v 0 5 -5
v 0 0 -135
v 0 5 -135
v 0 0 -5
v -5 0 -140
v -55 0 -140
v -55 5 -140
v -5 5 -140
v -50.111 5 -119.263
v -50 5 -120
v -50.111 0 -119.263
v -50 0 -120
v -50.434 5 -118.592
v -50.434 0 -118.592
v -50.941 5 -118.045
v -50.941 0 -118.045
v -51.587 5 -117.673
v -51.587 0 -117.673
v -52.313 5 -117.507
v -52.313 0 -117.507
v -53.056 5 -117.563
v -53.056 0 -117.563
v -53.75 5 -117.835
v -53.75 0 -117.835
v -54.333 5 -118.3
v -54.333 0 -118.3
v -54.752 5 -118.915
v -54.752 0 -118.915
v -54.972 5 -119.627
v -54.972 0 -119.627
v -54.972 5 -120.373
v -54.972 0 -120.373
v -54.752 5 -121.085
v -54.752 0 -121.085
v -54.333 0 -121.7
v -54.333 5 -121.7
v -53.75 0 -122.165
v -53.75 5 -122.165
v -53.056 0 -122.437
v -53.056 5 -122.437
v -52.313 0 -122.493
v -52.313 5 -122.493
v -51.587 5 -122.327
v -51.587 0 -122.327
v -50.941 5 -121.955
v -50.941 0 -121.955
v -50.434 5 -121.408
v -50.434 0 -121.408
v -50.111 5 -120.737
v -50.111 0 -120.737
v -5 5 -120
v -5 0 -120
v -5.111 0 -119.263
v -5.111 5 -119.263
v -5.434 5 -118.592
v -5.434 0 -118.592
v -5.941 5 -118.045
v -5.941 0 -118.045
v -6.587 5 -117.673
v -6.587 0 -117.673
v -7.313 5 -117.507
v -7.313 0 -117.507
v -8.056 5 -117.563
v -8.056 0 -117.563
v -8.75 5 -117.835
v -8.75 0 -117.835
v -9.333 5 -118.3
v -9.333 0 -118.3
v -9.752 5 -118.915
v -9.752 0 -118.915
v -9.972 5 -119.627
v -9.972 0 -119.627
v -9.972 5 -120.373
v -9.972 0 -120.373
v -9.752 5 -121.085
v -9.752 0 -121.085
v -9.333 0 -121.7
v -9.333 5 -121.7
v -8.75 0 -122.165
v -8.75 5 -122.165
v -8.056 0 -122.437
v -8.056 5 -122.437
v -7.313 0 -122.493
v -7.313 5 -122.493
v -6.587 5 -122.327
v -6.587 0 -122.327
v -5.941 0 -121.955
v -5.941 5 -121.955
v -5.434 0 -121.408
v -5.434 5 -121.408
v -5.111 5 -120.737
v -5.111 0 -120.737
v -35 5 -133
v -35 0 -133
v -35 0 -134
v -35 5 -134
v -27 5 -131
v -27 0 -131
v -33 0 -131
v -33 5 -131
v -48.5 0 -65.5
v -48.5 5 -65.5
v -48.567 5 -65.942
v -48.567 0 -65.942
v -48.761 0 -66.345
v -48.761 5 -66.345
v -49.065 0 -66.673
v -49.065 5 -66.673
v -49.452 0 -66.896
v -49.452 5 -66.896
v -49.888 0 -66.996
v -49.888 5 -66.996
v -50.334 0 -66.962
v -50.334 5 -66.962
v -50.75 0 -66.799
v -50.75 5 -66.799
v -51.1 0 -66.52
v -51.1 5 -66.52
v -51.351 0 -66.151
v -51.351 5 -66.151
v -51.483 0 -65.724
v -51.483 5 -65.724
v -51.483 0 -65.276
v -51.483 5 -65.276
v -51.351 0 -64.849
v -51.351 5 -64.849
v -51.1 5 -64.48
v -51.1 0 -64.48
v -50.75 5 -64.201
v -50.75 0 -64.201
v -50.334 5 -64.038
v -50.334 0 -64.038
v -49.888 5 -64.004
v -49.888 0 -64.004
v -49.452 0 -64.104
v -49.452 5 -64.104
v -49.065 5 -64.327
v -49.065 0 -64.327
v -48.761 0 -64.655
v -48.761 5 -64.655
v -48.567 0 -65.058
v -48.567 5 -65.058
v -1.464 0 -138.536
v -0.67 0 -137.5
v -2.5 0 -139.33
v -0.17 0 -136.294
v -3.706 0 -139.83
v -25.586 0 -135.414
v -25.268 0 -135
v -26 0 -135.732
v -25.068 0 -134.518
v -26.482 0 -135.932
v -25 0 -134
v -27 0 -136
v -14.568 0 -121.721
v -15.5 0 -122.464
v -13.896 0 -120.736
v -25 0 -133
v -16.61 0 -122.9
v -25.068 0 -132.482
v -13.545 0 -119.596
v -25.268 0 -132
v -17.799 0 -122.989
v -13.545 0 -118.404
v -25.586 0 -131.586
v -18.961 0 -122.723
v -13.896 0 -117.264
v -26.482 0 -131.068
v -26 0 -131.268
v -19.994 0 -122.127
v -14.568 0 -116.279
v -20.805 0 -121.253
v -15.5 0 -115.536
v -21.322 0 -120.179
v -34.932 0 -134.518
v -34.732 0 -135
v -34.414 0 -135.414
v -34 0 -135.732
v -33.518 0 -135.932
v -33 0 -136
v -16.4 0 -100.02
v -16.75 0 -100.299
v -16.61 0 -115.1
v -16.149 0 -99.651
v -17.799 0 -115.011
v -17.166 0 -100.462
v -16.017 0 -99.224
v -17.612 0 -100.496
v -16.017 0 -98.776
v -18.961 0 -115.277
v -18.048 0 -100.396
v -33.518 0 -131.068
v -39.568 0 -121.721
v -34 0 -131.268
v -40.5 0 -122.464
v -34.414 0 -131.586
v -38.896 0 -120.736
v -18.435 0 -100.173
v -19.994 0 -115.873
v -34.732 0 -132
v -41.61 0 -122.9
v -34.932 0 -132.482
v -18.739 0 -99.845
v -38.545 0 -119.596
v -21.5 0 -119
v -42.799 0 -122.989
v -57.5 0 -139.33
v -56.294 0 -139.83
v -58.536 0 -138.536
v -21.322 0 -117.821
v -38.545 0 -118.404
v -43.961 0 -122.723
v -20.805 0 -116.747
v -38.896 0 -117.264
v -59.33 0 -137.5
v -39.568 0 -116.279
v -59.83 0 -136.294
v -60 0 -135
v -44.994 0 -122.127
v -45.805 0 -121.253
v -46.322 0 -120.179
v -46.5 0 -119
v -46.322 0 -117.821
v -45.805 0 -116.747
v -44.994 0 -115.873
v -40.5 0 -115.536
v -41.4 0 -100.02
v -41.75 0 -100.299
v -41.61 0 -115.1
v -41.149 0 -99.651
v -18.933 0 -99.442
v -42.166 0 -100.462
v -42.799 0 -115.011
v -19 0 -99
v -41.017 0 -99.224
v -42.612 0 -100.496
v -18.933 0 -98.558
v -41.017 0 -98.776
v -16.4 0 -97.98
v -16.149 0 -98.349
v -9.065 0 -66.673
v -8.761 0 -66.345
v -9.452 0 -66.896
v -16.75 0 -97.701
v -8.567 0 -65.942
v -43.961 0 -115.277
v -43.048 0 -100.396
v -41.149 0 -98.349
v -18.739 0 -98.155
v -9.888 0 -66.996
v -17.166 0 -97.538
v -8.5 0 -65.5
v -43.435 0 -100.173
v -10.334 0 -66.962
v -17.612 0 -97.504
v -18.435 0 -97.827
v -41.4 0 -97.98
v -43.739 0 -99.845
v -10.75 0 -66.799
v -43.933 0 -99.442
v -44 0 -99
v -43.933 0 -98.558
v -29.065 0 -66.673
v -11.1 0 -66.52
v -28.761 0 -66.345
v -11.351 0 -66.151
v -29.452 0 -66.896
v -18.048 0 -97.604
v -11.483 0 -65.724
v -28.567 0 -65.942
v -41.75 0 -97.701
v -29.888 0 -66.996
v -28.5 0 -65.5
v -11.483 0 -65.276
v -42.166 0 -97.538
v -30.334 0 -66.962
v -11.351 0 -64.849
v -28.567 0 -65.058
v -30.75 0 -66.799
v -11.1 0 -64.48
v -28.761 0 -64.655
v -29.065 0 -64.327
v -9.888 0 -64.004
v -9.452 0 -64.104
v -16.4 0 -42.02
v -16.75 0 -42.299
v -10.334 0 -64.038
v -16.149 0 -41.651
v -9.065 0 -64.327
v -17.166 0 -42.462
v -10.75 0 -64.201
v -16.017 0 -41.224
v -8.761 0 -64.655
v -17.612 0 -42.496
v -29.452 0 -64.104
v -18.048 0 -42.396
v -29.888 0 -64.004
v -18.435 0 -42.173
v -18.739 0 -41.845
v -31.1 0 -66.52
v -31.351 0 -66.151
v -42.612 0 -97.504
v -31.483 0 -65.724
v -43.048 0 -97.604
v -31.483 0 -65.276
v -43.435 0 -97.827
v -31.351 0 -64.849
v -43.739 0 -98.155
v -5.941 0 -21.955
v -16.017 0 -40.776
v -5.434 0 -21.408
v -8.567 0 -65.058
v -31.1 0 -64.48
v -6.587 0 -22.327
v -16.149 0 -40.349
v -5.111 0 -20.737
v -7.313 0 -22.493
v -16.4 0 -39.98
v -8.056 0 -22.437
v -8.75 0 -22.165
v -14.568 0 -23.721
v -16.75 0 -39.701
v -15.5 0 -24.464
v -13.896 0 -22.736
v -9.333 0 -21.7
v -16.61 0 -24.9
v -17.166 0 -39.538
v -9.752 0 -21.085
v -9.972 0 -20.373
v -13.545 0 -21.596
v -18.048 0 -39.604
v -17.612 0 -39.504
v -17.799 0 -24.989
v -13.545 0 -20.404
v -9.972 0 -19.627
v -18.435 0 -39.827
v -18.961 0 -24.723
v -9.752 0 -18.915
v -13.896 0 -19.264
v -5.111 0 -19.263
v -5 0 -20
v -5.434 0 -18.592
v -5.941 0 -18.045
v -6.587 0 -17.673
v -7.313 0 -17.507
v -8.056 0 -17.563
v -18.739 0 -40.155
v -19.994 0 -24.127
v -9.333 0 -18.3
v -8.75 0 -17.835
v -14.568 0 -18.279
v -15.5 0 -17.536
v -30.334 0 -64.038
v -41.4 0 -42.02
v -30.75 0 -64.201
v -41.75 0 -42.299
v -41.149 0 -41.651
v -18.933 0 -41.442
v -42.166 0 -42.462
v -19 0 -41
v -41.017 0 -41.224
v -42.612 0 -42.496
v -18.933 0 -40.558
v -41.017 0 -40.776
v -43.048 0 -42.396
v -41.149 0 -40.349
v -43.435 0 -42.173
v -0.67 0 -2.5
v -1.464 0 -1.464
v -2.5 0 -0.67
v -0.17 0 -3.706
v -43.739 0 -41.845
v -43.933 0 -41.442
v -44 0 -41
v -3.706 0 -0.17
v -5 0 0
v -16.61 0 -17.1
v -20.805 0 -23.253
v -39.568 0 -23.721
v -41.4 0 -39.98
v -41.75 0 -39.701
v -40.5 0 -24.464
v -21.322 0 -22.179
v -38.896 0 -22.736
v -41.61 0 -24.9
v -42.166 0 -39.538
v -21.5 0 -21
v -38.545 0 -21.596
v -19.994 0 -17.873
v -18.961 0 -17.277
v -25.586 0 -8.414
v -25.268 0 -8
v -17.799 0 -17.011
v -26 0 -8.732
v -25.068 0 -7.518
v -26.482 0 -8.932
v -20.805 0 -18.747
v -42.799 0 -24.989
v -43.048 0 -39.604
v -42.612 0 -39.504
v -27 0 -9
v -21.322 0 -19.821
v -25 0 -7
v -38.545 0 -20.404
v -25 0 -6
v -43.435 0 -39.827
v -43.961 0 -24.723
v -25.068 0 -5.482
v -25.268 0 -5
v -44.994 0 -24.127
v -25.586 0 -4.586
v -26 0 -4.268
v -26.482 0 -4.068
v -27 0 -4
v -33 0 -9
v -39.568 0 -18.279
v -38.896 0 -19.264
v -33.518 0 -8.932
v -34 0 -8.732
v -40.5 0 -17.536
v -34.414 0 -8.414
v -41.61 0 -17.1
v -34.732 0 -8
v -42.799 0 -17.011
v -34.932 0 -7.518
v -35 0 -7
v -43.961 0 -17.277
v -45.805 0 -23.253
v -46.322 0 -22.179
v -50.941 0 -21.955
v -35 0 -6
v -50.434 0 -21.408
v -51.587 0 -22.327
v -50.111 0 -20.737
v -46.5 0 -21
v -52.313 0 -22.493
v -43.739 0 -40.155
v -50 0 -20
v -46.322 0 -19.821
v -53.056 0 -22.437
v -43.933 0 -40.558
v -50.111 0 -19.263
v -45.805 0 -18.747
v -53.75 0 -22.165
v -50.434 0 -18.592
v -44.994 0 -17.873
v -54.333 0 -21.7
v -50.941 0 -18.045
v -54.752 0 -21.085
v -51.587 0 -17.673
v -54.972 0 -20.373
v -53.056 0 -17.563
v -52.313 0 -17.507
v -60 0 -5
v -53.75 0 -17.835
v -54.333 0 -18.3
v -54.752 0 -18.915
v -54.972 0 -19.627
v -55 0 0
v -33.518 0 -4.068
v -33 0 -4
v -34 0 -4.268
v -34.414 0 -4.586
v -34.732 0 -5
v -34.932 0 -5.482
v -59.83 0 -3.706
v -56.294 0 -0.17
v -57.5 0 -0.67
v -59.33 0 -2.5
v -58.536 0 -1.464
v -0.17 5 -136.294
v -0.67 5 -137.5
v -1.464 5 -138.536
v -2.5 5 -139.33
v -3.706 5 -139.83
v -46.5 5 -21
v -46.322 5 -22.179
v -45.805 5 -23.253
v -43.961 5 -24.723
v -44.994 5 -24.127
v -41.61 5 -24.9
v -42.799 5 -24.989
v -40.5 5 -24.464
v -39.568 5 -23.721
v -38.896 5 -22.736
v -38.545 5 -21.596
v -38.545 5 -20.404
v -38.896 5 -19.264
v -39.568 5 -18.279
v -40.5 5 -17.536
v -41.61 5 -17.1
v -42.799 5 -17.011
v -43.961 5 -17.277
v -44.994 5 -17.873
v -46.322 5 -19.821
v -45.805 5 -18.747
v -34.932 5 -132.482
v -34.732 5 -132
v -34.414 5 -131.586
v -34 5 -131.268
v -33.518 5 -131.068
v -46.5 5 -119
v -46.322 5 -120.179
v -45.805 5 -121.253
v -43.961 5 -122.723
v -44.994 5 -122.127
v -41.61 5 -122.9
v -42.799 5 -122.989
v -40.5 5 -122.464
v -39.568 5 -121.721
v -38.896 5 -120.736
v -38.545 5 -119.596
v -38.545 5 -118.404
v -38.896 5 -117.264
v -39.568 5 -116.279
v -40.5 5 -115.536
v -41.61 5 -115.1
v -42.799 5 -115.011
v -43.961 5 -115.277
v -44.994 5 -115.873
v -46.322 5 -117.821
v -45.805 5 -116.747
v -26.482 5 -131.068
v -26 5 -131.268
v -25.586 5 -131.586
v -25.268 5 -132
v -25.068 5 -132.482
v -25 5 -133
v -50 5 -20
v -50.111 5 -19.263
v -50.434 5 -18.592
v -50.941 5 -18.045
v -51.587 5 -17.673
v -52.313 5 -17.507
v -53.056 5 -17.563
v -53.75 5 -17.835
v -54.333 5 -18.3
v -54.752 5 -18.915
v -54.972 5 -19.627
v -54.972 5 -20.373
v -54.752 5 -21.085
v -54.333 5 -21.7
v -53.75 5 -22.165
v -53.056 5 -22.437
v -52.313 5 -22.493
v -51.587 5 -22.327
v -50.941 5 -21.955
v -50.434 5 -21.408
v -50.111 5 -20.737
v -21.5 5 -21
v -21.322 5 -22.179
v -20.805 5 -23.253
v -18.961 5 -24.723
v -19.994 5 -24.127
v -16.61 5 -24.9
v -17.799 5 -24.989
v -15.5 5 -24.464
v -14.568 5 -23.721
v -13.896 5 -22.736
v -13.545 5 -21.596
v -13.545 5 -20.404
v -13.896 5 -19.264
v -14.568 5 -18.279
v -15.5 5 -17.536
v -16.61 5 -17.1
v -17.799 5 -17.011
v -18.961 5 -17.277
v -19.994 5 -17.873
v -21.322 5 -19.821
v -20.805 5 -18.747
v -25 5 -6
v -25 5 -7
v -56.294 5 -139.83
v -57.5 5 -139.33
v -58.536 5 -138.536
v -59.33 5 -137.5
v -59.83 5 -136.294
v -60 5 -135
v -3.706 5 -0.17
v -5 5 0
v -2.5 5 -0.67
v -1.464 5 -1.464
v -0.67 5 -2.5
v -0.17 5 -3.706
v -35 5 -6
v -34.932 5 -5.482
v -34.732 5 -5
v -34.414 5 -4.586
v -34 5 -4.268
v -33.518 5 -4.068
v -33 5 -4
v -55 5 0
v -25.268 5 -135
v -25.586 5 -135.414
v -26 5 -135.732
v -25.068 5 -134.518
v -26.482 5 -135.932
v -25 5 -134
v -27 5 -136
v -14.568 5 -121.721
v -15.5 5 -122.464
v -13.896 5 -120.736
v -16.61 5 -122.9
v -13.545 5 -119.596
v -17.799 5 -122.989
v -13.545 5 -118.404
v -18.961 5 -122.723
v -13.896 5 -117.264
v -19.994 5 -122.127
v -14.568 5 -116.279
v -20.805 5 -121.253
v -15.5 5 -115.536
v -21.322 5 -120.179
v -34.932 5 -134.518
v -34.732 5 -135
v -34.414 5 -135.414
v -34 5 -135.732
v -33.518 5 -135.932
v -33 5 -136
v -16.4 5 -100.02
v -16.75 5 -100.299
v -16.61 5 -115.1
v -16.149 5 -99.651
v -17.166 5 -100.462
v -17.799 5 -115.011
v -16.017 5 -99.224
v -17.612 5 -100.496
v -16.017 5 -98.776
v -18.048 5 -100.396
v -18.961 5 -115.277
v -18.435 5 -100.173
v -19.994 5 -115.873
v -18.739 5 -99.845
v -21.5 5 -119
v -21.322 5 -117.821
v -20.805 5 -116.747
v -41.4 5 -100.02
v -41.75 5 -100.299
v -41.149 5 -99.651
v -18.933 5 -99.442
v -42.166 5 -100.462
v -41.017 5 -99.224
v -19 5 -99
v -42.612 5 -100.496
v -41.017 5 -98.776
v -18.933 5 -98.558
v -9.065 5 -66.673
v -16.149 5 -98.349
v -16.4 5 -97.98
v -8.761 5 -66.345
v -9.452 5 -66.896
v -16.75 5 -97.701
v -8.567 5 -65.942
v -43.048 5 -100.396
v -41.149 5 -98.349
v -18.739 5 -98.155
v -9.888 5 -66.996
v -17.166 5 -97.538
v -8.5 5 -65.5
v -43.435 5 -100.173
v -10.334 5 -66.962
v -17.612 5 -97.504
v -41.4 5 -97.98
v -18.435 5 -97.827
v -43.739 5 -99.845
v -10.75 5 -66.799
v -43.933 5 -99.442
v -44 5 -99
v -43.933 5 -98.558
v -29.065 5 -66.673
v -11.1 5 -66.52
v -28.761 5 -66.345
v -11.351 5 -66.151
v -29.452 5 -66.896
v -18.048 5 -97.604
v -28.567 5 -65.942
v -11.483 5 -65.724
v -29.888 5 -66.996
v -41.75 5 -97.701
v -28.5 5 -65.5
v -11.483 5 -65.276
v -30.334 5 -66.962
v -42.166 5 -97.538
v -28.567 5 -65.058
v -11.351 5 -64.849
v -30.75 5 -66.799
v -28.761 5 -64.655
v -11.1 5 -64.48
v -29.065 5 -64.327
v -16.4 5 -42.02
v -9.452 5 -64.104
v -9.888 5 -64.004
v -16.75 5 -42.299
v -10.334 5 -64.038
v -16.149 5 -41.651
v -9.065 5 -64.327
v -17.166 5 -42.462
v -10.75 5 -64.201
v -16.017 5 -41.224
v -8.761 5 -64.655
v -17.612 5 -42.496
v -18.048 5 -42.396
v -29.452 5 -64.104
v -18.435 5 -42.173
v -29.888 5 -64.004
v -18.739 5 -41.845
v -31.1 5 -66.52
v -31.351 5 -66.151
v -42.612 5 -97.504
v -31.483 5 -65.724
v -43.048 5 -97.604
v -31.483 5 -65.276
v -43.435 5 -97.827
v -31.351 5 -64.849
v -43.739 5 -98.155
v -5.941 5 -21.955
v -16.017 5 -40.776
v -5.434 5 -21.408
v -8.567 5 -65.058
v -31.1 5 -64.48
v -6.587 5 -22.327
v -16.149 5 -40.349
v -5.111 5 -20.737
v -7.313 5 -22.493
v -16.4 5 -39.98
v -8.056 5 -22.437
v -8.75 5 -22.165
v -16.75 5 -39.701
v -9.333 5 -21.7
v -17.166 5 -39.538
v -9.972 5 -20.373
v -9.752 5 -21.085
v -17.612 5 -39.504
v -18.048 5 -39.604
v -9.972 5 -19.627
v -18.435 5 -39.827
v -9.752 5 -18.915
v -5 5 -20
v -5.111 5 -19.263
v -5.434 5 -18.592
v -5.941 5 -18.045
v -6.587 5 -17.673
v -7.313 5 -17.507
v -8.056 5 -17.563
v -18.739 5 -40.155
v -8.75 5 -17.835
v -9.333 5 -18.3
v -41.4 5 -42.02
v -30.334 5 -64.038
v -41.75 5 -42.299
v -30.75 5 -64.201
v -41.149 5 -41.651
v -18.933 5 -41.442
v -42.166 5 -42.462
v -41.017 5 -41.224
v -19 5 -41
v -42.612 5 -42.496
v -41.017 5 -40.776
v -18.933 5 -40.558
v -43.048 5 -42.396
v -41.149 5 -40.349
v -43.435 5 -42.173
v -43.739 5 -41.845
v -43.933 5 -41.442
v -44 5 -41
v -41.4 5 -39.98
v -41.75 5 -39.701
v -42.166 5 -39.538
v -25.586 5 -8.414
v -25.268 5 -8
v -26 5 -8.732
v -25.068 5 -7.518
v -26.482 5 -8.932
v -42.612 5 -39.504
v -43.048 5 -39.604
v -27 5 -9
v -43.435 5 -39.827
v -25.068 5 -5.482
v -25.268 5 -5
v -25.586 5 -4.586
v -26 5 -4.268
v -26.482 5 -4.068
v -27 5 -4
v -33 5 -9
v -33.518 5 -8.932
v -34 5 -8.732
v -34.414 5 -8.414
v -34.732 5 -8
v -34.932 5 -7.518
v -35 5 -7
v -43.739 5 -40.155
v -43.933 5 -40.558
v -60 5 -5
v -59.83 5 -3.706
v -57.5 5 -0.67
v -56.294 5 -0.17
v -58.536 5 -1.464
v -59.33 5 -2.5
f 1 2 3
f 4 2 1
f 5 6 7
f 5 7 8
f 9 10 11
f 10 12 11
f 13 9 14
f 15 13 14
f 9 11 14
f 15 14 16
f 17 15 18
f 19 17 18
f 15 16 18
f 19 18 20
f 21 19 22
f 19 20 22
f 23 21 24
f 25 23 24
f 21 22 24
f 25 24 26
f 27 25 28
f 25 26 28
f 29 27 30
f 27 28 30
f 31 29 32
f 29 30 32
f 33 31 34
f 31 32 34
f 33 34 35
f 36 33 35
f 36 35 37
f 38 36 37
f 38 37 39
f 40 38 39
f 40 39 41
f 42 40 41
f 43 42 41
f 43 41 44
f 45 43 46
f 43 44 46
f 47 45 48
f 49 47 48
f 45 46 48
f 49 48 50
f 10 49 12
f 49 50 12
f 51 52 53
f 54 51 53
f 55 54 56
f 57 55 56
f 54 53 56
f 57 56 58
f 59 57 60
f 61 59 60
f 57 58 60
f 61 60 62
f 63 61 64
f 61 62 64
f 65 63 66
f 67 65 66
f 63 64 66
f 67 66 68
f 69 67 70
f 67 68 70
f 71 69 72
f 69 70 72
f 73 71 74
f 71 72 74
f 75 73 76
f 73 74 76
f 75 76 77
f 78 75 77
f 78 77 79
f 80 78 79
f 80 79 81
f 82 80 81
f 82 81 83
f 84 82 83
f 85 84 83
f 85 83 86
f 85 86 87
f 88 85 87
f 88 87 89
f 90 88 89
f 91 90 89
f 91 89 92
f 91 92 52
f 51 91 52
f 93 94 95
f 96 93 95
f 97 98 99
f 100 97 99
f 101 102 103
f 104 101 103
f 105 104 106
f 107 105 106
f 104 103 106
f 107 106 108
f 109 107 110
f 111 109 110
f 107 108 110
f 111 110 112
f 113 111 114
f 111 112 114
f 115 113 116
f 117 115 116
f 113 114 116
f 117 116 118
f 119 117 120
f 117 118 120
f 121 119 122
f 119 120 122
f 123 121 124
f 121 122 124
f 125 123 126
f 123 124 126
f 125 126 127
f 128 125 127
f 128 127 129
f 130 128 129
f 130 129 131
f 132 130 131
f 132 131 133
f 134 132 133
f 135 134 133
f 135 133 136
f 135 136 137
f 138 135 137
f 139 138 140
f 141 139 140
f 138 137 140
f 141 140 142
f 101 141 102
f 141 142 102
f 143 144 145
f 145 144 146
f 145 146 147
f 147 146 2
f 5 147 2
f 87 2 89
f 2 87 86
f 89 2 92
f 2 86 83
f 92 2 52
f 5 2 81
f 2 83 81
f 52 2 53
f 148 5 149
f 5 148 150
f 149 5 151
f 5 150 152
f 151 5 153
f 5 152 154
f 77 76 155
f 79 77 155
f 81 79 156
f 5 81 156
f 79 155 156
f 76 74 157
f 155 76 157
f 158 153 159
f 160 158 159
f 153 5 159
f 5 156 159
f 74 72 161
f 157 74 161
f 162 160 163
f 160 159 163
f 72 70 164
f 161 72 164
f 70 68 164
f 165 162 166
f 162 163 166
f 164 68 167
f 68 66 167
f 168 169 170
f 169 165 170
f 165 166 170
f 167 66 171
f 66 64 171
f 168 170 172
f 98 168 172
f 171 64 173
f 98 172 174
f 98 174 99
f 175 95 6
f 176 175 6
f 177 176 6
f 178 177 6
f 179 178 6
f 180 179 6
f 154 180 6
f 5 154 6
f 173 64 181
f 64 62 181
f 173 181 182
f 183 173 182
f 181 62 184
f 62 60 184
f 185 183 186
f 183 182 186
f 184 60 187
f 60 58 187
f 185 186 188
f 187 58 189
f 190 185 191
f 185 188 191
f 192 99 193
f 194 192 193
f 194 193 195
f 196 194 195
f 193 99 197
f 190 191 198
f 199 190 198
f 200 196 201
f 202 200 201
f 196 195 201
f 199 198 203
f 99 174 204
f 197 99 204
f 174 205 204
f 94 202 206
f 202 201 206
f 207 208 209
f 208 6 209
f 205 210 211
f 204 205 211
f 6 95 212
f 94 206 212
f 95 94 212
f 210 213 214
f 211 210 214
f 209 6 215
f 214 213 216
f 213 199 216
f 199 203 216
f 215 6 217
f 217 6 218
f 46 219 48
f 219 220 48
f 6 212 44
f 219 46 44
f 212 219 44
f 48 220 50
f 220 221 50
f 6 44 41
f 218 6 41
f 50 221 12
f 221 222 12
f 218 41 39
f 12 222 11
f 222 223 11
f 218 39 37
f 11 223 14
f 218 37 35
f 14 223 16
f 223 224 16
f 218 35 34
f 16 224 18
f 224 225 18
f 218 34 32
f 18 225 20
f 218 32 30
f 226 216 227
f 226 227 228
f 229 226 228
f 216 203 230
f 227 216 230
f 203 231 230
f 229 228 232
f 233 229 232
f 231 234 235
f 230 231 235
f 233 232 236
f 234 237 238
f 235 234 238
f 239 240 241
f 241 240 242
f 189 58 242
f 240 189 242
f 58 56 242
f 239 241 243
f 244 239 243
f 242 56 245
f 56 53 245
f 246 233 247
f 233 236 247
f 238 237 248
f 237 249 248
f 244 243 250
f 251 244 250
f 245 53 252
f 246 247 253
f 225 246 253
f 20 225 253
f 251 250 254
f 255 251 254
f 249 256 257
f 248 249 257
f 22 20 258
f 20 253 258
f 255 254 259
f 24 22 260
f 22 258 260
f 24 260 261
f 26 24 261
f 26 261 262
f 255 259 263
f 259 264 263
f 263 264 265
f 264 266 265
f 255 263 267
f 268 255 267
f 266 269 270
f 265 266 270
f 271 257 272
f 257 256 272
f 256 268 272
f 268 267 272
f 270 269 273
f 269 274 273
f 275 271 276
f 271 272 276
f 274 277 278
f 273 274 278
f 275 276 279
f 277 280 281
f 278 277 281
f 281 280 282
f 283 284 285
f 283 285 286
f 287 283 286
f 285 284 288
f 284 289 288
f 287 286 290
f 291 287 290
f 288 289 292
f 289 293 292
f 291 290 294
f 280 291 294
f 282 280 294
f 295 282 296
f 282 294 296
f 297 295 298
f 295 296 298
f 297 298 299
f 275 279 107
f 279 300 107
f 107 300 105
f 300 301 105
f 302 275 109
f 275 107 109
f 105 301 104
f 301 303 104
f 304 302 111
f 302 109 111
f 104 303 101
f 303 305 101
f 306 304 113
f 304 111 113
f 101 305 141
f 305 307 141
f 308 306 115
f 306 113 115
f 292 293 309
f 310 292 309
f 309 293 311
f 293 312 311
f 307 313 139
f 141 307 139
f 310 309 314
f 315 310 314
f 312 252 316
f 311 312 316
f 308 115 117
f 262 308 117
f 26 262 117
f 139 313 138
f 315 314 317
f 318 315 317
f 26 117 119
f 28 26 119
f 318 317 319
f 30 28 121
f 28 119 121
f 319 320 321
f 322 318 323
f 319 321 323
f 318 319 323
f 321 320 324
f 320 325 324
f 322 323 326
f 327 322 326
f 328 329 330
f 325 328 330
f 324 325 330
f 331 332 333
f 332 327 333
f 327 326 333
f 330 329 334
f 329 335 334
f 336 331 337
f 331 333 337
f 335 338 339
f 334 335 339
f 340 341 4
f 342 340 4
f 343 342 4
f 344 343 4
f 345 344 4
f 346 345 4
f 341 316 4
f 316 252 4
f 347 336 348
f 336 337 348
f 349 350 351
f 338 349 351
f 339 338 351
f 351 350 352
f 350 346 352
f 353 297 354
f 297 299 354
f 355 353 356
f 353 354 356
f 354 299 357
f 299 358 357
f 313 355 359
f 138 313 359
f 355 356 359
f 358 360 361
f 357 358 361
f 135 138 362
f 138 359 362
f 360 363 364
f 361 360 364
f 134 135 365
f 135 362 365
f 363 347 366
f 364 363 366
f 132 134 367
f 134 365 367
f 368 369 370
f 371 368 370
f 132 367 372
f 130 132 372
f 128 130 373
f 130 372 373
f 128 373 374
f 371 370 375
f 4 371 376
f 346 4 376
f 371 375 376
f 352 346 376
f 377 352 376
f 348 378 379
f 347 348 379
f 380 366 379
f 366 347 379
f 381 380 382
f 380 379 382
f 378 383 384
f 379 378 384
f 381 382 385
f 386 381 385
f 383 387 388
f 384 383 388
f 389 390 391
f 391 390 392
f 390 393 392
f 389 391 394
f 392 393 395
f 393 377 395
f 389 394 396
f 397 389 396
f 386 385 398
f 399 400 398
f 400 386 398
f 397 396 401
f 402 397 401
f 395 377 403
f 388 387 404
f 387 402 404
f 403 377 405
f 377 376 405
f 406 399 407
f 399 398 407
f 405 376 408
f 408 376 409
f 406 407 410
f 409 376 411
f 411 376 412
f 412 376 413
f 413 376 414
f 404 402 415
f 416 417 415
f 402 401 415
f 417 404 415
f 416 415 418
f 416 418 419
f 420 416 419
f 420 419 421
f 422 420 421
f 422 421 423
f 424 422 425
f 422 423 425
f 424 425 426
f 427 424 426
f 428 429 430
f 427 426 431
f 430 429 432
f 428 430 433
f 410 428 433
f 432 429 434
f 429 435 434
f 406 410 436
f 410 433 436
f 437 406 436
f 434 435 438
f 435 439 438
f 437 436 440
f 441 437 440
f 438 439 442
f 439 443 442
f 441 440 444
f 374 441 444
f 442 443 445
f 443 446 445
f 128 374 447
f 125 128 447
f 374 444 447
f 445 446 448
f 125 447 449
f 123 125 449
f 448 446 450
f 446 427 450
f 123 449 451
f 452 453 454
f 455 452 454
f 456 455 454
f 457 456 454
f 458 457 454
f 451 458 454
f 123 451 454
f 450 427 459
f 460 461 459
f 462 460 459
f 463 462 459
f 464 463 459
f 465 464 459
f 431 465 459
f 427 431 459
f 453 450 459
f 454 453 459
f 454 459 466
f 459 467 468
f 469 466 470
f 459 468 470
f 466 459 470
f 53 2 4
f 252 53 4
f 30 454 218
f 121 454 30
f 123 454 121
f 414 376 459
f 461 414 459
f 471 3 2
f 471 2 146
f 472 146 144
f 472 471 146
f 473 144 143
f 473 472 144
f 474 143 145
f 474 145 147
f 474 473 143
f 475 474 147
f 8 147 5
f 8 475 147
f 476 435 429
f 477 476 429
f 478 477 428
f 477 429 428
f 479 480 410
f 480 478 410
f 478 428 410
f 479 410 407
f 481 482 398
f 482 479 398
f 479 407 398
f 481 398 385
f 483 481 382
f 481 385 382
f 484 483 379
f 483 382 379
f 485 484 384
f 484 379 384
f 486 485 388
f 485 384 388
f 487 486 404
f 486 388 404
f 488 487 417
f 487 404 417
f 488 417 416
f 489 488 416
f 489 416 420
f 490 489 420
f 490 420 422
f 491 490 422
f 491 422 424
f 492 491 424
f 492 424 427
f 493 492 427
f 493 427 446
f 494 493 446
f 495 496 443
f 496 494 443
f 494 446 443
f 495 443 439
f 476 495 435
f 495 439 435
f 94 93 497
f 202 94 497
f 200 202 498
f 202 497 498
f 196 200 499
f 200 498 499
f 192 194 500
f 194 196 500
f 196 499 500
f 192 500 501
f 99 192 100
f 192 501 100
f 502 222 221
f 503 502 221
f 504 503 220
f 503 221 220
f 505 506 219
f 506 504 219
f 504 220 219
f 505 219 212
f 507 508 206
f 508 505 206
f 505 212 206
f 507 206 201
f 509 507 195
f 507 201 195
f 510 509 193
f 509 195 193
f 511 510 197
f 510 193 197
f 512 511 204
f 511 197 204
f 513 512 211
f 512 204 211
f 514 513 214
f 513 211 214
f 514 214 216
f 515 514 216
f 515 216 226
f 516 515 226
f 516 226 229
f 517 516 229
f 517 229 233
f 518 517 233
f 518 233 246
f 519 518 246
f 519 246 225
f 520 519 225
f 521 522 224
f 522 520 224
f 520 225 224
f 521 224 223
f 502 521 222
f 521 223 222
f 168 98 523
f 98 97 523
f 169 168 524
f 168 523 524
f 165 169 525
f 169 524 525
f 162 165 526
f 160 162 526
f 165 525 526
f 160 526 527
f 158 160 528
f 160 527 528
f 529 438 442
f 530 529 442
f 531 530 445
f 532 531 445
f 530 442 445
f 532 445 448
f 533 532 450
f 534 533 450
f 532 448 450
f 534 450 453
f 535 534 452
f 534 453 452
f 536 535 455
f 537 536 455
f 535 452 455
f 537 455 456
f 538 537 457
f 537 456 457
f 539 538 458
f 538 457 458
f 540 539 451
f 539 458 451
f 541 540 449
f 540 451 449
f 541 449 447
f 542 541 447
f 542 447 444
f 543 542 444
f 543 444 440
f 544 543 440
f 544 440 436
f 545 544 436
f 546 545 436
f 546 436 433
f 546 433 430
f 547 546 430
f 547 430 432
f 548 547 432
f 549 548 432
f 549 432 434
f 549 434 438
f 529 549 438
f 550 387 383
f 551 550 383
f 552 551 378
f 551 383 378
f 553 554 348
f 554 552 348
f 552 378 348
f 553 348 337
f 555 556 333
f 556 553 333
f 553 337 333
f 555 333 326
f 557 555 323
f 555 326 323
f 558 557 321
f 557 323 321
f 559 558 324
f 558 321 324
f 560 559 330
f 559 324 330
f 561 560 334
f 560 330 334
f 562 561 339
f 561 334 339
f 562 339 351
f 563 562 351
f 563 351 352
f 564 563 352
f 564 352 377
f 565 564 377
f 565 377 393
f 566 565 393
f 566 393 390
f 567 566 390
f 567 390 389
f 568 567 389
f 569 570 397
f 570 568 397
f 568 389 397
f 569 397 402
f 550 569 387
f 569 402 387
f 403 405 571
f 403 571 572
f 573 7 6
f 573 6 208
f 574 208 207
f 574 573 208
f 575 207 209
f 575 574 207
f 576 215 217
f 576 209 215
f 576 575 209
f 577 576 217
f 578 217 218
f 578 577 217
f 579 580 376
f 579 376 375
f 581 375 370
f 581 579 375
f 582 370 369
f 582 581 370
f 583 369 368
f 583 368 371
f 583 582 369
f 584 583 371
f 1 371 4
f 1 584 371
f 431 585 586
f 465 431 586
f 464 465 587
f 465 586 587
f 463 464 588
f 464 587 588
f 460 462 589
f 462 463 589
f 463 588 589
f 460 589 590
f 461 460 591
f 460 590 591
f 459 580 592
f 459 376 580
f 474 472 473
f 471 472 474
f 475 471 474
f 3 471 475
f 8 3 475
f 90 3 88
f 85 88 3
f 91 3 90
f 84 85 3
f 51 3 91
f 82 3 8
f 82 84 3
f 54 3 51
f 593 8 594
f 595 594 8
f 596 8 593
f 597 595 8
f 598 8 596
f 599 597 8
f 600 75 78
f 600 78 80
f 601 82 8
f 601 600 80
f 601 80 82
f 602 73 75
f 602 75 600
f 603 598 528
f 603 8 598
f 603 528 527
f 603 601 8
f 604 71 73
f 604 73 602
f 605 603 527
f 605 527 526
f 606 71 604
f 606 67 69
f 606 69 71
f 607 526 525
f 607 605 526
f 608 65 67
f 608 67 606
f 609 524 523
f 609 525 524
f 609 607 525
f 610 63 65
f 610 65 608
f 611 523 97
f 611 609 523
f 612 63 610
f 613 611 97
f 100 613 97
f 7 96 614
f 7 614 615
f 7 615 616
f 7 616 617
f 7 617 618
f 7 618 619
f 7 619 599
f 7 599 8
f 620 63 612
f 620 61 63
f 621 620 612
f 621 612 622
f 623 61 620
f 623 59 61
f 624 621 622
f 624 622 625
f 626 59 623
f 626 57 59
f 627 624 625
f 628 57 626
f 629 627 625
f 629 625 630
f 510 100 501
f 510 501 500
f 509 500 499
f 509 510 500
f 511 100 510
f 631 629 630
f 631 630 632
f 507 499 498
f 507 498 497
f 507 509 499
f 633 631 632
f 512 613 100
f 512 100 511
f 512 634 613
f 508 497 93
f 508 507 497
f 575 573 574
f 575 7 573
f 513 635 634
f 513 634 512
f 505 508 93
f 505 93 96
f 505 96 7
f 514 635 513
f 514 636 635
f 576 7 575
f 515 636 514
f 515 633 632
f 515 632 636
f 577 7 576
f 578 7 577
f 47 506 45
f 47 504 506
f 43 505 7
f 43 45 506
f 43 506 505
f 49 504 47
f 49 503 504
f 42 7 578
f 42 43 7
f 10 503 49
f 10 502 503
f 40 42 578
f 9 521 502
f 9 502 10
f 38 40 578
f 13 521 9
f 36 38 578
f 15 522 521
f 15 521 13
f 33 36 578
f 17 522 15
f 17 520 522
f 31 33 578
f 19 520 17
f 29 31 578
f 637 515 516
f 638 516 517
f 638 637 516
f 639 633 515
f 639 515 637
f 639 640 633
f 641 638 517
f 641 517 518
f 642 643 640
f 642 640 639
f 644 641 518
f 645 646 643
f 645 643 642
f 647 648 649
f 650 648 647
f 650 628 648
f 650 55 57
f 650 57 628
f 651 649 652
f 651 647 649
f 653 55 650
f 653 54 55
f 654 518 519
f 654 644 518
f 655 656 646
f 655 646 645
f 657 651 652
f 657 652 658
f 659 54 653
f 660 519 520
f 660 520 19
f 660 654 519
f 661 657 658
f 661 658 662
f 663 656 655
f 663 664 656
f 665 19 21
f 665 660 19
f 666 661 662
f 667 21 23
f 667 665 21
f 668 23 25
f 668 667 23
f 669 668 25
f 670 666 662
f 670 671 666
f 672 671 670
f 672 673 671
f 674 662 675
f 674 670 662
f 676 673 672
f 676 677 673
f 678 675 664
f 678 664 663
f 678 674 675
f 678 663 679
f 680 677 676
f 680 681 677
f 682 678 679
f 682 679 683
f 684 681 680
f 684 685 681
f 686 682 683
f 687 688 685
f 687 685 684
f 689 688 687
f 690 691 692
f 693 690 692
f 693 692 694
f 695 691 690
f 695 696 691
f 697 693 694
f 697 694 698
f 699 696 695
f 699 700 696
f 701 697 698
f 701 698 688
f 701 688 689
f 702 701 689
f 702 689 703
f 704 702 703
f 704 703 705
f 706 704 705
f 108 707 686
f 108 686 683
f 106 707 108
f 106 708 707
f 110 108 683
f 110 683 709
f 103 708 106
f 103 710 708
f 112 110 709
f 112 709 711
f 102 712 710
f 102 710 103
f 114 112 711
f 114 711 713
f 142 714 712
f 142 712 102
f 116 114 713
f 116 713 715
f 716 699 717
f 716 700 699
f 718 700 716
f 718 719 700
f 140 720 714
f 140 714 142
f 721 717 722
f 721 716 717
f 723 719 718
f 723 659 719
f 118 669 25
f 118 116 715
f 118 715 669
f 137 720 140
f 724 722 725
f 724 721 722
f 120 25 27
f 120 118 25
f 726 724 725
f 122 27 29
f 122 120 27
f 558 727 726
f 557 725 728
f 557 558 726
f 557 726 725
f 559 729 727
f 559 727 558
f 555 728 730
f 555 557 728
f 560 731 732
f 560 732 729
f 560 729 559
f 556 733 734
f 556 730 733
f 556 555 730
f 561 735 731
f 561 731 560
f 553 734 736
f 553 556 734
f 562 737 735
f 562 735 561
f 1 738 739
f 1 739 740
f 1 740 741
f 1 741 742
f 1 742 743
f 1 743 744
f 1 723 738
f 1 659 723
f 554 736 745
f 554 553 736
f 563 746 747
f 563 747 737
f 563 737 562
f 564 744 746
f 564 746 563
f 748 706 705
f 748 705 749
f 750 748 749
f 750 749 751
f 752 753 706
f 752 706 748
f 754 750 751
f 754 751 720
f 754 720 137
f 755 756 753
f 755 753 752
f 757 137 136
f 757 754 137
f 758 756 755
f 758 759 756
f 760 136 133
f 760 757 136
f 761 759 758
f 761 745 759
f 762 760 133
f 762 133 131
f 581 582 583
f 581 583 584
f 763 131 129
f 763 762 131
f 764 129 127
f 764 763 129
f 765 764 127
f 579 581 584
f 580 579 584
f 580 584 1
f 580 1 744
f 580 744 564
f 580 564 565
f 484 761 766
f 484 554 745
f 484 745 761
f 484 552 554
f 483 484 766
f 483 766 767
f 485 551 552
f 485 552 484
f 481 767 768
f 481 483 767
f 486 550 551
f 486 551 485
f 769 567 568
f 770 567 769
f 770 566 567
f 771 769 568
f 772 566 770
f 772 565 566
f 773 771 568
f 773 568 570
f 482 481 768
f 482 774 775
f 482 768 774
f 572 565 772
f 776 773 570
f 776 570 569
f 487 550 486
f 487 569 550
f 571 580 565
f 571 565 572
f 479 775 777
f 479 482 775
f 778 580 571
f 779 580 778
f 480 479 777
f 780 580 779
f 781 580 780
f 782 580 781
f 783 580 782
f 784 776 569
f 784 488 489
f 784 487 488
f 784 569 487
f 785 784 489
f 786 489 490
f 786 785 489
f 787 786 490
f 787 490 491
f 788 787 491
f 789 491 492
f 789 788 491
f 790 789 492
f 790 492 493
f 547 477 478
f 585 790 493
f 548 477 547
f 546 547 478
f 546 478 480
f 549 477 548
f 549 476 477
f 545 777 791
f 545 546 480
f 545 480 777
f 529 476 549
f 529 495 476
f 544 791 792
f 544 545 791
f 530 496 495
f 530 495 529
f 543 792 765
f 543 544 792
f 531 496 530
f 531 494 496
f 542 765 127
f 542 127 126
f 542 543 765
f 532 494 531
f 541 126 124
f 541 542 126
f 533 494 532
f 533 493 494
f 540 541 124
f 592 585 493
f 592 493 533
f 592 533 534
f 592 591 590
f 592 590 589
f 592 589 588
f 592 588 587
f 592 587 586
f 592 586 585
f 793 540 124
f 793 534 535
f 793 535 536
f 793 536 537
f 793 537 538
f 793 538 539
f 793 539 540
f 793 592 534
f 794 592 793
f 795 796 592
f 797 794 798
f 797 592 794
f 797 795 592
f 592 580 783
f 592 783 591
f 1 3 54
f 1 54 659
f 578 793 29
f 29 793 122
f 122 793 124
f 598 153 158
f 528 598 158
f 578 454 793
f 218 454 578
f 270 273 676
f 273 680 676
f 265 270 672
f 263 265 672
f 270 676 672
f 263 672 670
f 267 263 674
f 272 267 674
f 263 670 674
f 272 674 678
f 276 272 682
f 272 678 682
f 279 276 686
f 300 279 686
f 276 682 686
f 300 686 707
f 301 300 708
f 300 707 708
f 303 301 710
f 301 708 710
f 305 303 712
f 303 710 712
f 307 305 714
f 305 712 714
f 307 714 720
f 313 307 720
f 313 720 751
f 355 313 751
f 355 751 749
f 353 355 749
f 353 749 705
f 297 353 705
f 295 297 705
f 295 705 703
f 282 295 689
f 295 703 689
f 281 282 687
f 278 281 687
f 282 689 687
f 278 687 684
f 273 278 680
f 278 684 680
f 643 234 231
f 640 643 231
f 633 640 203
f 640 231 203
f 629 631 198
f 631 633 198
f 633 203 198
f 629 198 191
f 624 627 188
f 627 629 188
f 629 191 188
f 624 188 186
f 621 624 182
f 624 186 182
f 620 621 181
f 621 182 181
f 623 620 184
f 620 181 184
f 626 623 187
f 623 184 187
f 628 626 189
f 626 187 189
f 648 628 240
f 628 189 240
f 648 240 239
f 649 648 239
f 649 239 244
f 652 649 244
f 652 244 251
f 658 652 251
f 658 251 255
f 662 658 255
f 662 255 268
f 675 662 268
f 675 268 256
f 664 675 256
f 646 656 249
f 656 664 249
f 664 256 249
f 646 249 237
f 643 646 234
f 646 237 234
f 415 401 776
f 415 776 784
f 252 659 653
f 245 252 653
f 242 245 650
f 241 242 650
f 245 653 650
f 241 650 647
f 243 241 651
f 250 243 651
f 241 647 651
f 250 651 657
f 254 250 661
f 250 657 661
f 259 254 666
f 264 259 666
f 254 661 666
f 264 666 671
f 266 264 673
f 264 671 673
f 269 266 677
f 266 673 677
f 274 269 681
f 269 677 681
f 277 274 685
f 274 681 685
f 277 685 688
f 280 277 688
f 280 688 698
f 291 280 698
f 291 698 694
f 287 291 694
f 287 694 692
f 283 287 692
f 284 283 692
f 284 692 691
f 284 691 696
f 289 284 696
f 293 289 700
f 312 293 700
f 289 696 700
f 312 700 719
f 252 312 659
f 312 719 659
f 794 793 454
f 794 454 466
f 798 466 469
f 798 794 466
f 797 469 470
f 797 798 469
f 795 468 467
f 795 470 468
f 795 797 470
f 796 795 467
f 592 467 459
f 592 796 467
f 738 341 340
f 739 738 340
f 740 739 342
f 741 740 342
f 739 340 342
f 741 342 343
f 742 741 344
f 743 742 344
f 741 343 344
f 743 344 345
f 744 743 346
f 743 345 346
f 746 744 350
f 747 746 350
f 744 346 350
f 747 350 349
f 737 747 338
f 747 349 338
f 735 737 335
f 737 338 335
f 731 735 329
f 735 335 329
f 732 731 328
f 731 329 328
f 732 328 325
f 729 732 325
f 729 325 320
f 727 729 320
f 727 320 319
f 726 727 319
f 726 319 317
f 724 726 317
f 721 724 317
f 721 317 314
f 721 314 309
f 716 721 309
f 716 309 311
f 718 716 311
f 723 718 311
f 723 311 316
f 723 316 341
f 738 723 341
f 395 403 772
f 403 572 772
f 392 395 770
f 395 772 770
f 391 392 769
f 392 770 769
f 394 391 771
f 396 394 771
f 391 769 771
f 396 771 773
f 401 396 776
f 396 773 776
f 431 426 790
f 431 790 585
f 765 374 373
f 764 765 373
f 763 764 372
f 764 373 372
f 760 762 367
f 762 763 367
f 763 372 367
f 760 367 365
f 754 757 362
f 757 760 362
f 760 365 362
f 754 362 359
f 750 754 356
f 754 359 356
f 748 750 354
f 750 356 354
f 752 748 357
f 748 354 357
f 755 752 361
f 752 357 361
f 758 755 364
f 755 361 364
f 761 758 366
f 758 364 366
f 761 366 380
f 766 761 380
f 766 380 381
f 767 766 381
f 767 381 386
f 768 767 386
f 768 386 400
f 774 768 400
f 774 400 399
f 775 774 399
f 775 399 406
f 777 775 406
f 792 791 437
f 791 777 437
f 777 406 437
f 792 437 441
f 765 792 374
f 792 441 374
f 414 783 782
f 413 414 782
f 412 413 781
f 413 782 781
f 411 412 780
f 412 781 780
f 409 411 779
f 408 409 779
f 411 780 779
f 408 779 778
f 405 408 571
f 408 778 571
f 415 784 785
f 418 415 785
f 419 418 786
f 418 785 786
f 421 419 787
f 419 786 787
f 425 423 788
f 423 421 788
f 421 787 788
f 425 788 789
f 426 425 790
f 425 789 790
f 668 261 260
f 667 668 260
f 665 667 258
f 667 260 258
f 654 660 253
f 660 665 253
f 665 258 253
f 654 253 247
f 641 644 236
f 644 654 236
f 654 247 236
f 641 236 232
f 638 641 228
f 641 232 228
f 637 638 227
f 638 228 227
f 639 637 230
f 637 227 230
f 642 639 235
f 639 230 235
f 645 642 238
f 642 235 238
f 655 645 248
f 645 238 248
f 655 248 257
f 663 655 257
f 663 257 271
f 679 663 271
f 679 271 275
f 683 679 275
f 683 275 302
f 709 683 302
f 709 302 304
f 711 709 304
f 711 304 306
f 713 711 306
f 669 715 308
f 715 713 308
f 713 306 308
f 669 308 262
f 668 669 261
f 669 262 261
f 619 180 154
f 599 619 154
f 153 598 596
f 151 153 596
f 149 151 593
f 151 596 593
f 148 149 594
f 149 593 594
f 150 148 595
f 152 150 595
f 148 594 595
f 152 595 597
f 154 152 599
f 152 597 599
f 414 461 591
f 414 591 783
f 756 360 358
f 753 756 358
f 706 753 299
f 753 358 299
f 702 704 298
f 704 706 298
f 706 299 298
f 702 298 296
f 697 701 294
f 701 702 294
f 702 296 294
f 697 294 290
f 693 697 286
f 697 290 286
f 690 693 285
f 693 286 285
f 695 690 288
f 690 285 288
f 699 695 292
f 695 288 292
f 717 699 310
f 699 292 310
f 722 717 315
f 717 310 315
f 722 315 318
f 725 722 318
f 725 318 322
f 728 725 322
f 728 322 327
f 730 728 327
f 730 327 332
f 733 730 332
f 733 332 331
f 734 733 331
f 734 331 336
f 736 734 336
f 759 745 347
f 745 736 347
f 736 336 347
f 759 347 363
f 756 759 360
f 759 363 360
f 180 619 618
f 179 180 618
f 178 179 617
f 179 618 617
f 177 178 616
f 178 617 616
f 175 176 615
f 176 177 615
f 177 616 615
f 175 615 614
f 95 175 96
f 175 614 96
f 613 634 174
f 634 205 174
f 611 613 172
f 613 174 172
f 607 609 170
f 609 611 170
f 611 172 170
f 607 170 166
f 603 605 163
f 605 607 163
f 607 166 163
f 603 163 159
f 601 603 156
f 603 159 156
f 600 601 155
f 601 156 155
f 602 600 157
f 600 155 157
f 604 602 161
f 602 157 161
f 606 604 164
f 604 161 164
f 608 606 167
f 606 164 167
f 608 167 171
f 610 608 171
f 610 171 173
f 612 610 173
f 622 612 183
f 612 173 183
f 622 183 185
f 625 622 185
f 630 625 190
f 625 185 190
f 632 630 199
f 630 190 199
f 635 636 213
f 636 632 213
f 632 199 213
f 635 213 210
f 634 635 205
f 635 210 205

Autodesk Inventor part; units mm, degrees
ref_plane "YZ Plane" through (0, 0, 0) normal (1, 0, 0) x (0, 1, 0)
ref_plane "XZ Plane" through (0, 0, 0) normal (0, 1, 0) x (-1, 0, 0)
ref_plane "XY Plane" through (0, 0, 0) normal (0, 0, 1) x (1, 0, 0)
sketch "Sketch1" plane through (0, 0, 0) normal (0, 1, 0) x (-1, 0, 0)
  line L0 (0, 0) -> (60, 0)
  line L1 (60, 0) -> (60, -140)
  line L2 (60, -140) -> (0, -140)
  line L3 (0, -140) -> (0, 0)
  line L4 (30, -20.8594) -> (30, -183.1932) construction
  line L5 (42.5, -21.7206) -> (42.5, -191.0157) construction
  line L6 (17.5, -21.7206) -> (17.5, -184.1979) construction
  circle A0 centre (42.5, -21) radius 4
  circle A1 centre (42.5, -41) radius 1.5
  circle A2 centre (42.5, -99) radius 1.5
  circle A3 centre (42.5, -119) radius 4
  circle A4 centre (17.5, -99) radius 1.5
  circle A5 centre (17.5, -119) radius 4
  circle A6 centre (17.5, -41) radius 1.5
  circle A7 centre (17.5, -21) radius 4
  dimension "d0" = 140
  dimension "d1" = 60
  dimension "d2" = 30
  dimension "d3" = 12.5
  dimension "d4" = 12.5
  dimension "d5" = 8
  dimension "d6" = 3
  dimension "d7" = 3
  dimension "d8" = 8
  dimension "d9" = 3
  dimension "d10" = 8
  dimension "d11" = 3
  dimension "d12" = 8
  dimension "d13" = 20
  dimension "d14" = 20
  dimension "d15" = 20
  dimension "d16" = 20
  dimension "d17" = 21
  dimension "d18" = 21
  dimension "d19" = 21
  dimension "d20" = 21
extrude "Extrusion1" add sketch "Sketch1" along normal blind 5
sketch "Sketch2" plane through (0, 0, 0) normal (0, -1, 0) x (1, 0, 0)
  circle A0 centre (-52.5, -120) radius 2.5
  circle A1 centre (-52.5, -20) radius 2.5
  circle A2 centre (-7.5, -120) radius 2.5
  circle A3 centre (-7.5, -20) radius 2.5
  line L0 (-60, -140) -> (-60, 0) projected
  line L1 (0, -140) -> (-60, -140) projected
  line L2 (-60, 0) -> (0, 0) projected
  line L3 (0, 0) -> (0, -140) projected
  dimension "d23" = 5
  dimension "d24" = 5
  dimension "d25" = 5
  dimension "d26" = 5
  dimension "d27" = 7.5
  dimension "d28" = 20
  dimension "d29" = 7.5
  dimension "d30" = 20
  dimension "d31" = 20
  dimension "d32" = 7.5
  dimension "d33" = 20
  dimension "d34" = 7.5
extrude "Extrusion2" cut sketch "Sketch2" against normal blind 10 contours A0 | A1 | A2 | A3
sketch "Sketch3" plane through (0, 0, 0) normal (0, -1, 0) x (1, 0, 0)
  line L0 (-68.3542, -70) -> (15.9682, -70) construction
  line L1 (0, -140) -> (-60, -140) projected
  line L2 (-35, -136) -> (-25, -136)
  line L3 (-25, -136) -> (-25, -131)
  line L4 (-25, -131) -> (-35, -131)
  line L5 (-35, -131) -> (-35, -136)
  line L6 (-60, -140) -> (-60, 0) projected
  line L7 (-35, -4) -> (-25, -4)
  line L8 (-25, -4) -> (-25, -9)
  line L9 (-25, -9) -> (-35, -9)
  line L10 (-35, -9) -> (-35, -4)
  point P0 (0, 0)
  dimension "d40" = 70
  dimension "d41" = 10
  dimension "d42" = 25
  dimension "d43" = 4
  dimension "d44" = 5
extrude "Extrusion3" cut sketch "Sketch3" against normal blind 10
fillet "Fillet2" radius 5 4 edges at (0, 2.5, -140) (-60, 2.5, -140) (-60, 2.5, 0) (0, 2.5, 0)
sketch "Sketch4" plane through (0, 5, 0) normal (0, 1, 0) x (1, 0, 0)
  circle A0 centre (-10, 65.5) radius 1.5
  circle A1 centre (-30, 65.5) radius 1.5
  circle A2 centre (-50, 65.5) radius 1.5
  line L0 (3.8133, 65.5) -> (-51.9818, 65.5) construction
  line L1 (-55, 0) -> (-5, 0) projected
  line L2 (0, 5) -> (0, 135) projected
  point P0 (0, 0)
  dimension "d49" = 3
  dimension "d50" = 3
  dimension "d51" = 3
  dimension "d52" = 65.5
  dimension "d53" = 10
  dimension "d54" = 30
  dimension "d55" = 50
extrude "Extrusion4" cut sketch "Sketch4" against normal blind 10
fillet "Fillet3" radius 2 8 edges at (-25, 2.5, -131) (-25, 2.5, -136) (-35, 2.5, -136) (-35, 2.5, -131) (-25, 2.5, -9) (-25, 2.5, -4) (-35, 2.5, -4) (-35, 2.5, -9)
equation "\"d2\" = 0.5 * d1"
equation "\"d4\" = d3"
equation "\"d8\" = d5"
equation "\"d10\" = d5"
equation "\"d12\" = d5"
equation "\"d14\" = d13"
equation "\"d15\" = d13"
equation "\"d16\" = d13"
equation "\"d18\" = d17"
equation "\"d19\" = d17"
equation "\"d20\" = d17"
equation "\"d29\" = d27"
equation "\"d30\" = d28"
equation "\"d31\" = d28"
equation "\"d32\" = d27"
equation "\"d33\" = d28"
equation "\"d34\" = d27"
properties part number "Y-Axis_back_plate_top" material "PET Plastic"
